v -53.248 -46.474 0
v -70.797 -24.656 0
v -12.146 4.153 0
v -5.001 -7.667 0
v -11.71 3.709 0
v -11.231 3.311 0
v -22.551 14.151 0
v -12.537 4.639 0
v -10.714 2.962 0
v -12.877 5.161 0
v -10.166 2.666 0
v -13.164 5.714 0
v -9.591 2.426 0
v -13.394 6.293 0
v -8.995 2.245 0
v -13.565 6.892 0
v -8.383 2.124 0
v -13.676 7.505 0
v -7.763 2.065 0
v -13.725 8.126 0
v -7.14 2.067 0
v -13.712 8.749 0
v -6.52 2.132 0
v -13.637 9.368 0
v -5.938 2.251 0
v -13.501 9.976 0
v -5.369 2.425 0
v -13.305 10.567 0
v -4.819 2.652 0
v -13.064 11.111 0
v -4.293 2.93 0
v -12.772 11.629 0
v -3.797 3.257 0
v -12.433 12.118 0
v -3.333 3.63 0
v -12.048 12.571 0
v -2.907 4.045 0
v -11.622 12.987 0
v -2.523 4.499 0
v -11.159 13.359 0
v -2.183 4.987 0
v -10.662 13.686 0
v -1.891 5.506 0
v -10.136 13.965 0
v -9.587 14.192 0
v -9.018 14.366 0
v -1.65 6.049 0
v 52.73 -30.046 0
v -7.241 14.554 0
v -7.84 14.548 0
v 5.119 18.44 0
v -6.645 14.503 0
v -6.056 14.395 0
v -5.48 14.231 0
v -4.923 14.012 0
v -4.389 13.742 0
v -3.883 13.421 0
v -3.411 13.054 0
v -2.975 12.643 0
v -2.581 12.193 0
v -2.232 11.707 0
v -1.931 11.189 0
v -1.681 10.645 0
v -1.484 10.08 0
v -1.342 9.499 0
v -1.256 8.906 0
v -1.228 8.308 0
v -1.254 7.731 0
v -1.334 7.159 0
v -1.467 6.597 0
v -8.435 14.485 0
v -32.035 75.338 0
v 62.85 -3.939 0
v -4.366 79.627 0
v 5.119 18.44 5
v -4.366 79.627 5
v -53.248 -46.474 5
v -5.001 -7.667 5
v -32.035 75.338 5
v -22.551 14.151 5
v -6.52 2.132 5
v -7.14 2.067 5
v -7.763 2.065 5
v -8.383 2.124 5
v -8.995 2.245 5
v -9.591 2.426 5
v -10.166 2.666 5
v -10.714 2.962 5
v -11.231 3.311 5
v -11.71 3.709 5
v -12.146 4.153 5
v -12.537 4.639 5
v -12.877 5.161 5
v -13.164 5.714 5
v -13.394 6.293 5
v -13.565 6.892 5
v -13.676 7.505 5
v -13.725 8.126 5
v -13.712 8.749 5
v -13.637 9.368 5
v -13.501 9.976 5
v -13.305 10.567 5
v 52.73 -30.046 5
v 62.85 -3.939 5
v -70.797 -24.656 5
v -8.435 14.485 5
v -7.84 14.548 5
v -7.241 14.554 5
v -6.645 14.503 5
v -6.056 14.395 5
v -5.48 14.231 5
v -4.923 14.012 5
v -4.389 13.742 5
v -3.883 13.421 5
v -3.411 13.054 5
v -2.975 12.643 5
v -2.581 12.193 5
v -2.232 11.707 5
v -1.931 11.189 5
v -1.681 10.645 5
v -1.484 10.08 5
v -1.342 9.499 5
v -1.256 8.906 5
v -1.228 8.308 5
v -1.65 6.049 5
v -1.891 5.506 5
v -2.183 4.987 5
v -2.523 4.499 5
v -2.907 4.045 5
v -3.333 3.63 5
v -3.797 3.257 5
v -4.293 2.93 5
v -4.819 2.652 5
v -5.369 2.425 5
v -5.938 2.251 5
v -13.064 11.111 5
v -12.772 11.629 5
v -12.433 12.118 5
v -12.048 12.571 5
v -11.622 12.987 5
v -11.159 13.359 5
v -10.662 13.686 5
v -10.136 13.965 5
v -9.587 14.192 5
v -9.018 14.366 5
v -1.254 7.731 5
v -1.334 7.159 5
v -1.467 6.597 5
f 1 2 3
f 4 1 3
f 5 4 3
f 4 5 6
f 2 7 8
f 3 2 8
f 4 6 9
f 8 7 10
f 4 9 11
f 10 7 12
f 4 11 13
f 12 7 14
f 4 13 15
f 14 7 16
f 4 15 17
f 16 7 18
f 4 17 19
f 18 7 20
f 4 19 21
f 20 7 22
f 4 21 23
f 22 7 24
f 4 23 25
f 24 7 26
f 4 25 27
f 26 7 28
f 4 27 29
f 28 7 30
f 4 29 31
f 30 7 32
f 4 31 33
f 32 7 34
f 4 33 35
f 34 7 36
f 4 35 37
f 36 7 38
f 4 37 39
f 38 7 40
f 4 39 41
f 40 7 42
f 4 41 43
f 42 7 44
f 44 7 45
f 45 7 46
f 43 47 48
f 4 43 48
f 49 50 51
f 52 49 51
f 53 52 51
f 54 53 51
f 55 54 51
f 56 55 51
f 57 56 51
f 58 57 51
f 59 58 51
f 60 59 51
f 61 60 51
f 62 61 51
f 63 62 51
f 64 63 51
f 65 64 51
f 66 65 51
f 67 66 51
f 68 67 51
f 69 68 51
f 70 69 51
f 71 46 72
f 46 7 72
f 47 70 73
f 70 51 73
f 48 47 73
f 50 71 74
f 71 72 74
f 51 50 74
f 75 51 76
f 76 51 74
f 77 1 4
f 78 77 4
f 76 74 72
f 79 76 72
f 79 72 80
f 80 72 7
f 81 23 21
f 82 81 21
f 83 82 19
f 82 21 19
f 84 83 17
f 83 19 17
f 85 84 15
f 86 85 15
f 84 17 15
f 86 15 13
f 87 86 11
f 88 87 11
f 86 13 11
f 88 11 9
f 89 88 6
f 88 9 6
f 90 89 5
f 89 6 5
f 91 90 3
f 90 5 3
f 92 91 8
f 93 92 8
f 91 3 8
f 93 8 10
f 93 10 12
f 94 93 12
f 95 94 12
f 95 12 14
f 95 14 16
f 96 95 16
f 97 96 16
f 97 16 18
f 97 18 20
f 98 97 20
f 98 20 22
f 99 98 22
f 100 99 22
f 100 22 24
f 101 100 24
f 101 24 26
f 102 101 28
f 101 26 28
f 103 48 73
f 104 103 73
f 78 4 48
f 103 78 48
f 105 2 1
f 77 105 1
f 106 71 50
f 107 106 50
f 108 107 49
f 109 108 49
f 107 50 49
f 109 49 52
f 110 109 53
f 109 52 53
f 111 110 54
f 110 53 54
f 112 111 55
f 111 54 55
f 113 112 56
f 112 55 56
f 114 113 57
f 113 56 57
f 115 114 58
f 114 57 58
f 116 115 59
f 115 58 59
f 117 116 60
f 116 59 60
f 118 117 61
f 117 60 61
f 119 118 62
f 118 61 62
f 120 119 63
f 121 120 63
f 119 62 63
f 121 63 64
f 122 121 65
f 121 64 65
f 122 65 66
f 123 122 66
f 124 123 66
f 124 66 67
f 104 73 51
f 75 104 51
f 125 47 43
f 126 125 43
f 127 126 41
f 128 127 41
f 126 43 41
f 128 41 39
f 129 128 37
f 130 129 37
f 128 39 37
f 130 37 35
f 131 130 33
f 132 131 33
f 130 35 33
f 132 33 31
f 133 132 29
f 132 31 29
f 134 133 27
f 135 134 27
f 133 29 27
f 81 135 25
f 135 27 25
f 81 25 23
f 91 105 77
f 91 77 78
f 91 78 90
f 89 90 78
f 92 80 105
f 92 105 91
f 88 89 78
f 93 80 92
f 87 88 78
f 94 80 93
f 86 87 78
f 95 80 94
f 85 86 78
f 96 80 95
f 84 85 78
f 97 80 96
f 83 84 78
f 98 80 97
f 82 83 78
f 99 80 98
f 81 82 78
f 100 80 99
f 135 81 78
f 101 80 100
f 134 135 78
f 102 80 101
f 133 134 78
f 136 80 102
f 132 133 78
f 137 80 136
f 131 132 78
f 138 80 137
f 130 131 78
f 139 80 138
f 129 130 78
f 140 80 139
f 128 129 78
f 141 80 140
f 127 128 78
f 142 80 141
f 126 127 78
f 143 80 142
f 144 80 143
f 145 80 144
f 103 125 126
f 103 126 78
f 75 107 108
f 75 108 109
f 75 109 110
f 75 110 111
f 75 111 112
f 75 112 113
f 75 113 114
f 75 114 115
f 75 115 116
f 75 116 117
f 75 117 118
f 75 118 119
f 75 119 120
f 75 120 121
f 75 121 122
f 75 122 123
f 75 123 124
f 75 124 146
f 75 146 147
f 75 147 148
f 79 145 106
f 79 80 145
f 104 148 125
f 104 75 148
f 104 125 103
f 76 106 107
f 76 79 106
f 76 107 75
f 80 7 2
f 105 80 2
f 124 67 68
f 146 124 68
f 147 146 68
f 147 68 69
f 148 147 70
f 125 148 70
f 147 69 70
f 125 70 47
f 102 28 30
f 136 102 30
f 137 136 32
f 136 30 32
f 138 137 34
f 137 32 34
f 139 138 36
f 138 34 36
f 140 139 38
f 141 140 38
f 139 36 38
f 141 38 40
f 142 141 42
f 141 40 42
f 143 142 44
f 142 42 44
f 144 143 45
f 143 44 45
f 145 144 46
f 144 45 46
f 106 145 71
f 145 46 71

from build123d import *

# Parameters (mm, degrees)
F1_DEPTH = 5


with BuildPart() as f1:
    # F0 (on Top) → F1 (new body)
    with BuildSketch(Plane.XY):
        with BuildLine():
            Line((-4.36566, 79.626773), (-32.035204, 75.337673))
            Line((-32.035204, 75.337673), (-22.550609, 14.151324))
            Line((-22.550609, 14.151324), (-13.305154, 10.567361))
            ThreePointArc((-13.305154, 10.567361), (-11.394923, 13.178449), (-8.43507, 14.484602))
            ThreePointArc((-8.43507, 14.484602), (-3.410814, 13.054214), (-1.227681, 8.308365))
            ThreePointArc((-1.227681, 8.308365), (-1.334221, 7.159279), (-1.650209, 6.049369))
            ThreePointArc((-1.650209, 6.049369), (-3.56044, 3.438281), (-6.520293, 2.132127))
            Line((-6.520293, 2.132127), (-5.001368, -7.666653))
            Line((-5.001368, -7.666653), (52.729861, -30.045928))
            Line((52.729861, -30.045928), (62.850163, -3.938851))
            Line((62.850163, -3.938851), (5.118934, 18.440424))
            Line((5.118934, 18.440424), (-4.36566, 79.626773))
        make_face()
        with BuildLine():
            Line((-13.305154, 10.567361), (-22.550609, 14.151324))
            Line((-22.550609, 14.151324), (-70.797245, -24.65575))
            Line((-70.797245, -24.65575), (-53.248003, -46.473727))
            Line((-53.248003, -46.473727), (-5.001368, -7.666653))
            Line((-5.001368, -7.666653), (-6.520293, 2.132127))
            ThreePointArc((-6.520293, 2.132127), (-12.347765, 4.391123), (-13.305154, 10.567361))
        make_face()
    extrude(amount=F1_DEPTH)


solid = f1.part
